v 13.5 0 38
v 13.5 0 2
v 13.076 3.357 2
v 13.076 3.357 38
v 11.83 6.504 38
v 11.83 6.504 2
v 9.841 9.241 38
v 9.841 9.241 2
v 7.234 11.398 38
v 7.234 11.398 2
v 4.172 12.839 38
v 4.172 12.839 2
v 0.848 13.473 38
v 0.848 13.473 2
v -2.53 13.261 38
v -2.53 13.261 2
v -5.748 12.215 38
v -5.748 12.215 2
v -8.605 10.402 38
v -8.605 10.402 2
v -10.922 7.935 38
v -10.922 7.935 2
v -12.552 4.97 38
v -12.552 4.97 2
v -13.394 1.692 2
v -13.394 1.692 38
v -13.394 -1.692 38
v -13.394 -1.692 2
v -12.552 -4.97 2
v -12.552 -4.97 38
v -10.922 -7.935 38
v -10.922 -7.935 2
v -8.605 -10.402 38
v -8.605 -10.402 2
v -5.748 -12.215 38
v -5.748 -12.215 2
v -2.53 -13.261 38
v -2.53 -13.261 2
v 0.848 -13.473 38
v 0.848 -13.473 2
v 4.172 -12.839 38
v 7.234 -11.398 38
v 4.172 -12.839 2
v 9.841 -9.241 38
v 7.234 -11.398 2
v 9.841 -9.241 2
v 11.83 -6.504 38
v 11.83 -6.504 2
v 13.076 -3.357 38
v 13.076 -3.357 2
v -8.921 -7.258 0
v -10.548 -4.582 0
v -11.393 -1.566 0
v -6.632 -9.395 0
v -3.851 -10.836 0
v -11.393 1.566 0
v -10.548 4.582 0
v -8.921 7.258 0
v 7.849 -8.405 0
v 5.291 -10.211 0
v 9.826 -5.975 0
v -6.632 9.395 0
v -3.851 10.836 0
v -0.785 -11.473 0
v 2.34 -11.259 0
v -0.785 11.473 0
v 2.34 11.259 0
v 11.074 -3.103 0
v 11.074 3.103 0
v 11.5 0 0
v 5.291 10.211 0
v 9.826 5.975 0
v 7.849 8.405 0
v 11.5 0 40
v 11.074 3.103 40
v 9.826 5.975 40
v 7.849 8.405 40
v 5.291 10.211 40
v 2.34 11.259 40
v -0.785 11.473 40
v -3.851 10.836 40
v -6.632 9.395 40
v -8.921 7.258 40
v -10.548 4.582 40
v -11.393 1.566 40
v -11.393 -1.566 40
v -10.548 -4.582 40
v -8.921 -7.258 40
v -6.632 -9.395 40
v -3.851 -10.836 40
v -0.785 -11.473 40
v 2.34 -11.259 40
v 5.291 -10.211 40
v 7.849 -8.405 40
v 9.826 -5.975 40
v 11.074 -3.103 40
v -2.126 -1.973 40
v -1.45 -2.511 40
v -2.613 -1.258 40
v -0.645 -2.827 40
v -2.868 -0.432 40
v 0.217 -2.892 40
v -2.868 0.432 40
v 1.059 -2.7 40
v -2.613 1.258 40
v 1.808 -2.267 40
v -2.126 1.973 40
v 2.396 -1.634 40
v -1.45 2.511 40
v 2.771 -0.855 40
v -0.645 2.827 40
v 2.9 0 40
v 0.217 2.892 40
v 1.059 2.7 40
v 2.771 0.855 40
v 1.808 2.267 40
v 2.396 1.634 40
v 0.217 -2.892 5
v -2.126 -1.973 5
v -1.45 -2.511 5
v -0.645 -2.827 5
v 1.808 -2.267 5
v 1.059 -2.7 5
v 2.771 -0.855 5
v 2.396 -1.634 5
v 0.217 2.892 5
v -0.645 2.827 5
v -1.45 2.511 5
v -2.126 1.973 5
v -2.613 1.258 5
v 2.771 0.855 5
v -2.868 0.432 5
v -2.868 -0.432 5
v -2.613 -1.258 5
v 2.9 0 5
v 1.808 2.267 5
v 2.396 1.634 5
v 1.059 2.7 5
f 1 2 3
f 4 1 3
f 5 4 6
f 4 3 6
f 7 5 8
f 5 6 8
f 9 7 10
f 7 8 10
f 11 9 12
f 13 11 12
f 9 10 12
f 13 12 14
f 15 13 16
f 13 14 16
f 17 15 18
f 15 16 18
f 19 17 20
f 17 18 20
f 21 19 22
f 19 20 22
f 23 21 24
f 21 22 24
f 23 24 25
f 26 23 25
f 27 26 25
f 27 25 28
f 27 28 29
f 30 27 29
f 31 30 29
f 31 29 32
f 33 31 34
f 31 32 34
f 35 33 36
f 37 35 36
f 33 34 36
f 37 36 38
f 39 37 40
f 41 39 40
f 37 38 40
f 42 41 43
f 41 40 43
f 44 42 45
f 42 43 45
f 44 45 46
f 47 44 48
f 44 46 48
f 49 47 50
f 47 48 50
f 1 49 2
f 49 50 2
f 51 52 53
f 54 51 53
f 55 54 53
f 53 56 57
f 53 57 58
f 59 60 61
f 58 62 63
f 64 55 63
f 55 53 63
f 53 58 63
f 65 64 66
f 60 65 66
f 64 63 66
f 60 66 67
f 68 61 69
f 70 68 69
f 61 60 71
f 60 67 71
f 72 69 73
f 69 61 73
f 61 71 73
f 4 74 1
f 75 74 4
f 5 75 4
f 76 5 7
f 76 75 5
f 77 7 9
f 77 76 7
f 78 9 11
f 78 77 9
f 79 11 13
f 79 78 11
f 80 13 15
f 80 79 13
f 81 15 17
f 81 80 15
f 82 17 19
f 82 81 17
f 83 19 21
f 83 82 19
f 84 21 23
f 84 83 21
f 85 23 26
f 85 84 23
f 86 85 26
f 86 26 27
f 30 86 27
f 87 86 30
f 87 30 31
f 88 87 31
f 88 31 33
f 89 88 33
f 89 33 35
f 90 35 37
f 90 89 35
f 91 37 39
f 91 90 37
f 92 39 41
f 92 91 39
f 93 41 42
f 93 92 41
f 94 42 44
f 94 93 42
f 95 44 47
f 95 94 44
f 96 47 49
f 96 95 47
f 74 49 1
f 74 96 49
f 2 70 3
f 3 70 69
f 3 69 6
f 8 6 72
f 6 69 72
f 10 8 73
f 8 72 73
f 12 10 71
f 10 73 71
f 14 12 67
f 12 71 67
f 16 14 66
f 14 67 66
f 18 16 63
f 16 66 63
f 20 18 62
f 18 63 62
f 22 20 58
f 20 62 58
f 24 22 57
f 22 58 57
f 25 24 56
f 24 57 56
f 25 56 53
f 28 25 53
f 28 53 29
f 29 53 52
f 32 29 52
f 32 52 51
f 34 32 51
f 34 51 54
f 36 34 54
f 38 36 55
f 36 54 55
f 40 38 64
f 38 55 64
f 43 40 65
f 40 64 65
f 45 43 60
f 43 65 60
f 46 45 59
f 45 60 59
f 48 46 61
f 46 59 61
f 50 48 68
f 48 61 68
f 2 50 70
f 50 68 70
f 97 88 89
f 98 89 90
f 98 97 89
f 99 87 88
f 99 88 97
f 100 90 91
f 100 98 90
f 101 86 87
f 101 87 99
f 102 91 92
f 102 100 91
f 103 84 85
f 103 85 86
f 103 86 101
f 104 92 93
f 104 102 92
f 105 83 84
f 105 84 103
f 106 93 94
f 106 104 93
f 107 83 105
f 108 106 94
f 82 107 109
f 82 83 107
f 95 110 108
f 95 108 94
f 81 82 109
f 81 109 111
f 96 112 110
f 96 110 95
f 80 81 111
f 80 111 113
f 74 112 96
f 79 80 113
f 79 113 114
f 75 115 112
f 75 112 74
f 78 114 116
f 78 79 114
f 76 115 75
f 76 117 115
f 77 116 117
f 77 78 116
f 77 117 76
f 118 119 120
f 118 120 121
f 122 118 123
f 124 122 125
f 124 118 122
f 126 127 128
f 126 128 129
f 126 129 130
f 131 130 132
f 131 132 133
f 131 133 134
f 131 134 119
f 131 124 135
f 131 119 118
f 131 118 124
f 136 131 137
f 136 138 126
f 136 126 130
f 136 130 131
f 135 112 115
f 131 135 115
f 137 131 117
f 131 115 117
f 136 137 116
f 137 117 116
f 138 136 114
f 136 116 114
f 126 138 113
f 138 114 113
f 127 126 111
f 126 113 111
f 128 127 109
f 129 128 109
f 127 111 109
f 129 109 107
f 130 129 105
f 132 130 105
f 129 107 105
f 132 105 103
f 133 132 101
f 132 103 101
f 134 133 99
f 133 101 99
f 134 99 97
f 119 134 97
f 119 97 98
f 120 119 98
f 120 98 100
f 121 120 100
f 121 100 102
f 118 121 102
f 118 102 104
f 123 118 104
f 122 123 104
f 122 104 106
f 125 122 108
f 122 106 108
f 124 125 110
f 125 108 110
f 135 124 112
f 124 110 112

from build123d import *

# Parameters (mm, degrees)
F0_R     = 13.5
F1_DEPTH = 40
F2_R     = 2.9
F3_DEPTH = 35
F4_SIZE  = 2


with BuildPart() as f1:
    # F0 (on Top) → F1 (new body)
    with BuildSketch(Plane.XY):
        Circle(F0_R)
    extrude(amount=F1_DEPTH)

    # F2 (on face) → F3 (cut)
    with BuildSketch(Plane.XY.offset(40)):
        Circle(F2_R)
    extrude(amount=-F3_DEPTH, mode=Mode.SUBTRACT)

    # F4
    f4_edges = [f1.edges().sort_by_distance(p)[0] for p in [
        (-13.5, 0, 0),
        (-13.5, 0, 40),
    ]]
    chamfer(f4_edges, length=F4_SIZE)


solid = f1.part
